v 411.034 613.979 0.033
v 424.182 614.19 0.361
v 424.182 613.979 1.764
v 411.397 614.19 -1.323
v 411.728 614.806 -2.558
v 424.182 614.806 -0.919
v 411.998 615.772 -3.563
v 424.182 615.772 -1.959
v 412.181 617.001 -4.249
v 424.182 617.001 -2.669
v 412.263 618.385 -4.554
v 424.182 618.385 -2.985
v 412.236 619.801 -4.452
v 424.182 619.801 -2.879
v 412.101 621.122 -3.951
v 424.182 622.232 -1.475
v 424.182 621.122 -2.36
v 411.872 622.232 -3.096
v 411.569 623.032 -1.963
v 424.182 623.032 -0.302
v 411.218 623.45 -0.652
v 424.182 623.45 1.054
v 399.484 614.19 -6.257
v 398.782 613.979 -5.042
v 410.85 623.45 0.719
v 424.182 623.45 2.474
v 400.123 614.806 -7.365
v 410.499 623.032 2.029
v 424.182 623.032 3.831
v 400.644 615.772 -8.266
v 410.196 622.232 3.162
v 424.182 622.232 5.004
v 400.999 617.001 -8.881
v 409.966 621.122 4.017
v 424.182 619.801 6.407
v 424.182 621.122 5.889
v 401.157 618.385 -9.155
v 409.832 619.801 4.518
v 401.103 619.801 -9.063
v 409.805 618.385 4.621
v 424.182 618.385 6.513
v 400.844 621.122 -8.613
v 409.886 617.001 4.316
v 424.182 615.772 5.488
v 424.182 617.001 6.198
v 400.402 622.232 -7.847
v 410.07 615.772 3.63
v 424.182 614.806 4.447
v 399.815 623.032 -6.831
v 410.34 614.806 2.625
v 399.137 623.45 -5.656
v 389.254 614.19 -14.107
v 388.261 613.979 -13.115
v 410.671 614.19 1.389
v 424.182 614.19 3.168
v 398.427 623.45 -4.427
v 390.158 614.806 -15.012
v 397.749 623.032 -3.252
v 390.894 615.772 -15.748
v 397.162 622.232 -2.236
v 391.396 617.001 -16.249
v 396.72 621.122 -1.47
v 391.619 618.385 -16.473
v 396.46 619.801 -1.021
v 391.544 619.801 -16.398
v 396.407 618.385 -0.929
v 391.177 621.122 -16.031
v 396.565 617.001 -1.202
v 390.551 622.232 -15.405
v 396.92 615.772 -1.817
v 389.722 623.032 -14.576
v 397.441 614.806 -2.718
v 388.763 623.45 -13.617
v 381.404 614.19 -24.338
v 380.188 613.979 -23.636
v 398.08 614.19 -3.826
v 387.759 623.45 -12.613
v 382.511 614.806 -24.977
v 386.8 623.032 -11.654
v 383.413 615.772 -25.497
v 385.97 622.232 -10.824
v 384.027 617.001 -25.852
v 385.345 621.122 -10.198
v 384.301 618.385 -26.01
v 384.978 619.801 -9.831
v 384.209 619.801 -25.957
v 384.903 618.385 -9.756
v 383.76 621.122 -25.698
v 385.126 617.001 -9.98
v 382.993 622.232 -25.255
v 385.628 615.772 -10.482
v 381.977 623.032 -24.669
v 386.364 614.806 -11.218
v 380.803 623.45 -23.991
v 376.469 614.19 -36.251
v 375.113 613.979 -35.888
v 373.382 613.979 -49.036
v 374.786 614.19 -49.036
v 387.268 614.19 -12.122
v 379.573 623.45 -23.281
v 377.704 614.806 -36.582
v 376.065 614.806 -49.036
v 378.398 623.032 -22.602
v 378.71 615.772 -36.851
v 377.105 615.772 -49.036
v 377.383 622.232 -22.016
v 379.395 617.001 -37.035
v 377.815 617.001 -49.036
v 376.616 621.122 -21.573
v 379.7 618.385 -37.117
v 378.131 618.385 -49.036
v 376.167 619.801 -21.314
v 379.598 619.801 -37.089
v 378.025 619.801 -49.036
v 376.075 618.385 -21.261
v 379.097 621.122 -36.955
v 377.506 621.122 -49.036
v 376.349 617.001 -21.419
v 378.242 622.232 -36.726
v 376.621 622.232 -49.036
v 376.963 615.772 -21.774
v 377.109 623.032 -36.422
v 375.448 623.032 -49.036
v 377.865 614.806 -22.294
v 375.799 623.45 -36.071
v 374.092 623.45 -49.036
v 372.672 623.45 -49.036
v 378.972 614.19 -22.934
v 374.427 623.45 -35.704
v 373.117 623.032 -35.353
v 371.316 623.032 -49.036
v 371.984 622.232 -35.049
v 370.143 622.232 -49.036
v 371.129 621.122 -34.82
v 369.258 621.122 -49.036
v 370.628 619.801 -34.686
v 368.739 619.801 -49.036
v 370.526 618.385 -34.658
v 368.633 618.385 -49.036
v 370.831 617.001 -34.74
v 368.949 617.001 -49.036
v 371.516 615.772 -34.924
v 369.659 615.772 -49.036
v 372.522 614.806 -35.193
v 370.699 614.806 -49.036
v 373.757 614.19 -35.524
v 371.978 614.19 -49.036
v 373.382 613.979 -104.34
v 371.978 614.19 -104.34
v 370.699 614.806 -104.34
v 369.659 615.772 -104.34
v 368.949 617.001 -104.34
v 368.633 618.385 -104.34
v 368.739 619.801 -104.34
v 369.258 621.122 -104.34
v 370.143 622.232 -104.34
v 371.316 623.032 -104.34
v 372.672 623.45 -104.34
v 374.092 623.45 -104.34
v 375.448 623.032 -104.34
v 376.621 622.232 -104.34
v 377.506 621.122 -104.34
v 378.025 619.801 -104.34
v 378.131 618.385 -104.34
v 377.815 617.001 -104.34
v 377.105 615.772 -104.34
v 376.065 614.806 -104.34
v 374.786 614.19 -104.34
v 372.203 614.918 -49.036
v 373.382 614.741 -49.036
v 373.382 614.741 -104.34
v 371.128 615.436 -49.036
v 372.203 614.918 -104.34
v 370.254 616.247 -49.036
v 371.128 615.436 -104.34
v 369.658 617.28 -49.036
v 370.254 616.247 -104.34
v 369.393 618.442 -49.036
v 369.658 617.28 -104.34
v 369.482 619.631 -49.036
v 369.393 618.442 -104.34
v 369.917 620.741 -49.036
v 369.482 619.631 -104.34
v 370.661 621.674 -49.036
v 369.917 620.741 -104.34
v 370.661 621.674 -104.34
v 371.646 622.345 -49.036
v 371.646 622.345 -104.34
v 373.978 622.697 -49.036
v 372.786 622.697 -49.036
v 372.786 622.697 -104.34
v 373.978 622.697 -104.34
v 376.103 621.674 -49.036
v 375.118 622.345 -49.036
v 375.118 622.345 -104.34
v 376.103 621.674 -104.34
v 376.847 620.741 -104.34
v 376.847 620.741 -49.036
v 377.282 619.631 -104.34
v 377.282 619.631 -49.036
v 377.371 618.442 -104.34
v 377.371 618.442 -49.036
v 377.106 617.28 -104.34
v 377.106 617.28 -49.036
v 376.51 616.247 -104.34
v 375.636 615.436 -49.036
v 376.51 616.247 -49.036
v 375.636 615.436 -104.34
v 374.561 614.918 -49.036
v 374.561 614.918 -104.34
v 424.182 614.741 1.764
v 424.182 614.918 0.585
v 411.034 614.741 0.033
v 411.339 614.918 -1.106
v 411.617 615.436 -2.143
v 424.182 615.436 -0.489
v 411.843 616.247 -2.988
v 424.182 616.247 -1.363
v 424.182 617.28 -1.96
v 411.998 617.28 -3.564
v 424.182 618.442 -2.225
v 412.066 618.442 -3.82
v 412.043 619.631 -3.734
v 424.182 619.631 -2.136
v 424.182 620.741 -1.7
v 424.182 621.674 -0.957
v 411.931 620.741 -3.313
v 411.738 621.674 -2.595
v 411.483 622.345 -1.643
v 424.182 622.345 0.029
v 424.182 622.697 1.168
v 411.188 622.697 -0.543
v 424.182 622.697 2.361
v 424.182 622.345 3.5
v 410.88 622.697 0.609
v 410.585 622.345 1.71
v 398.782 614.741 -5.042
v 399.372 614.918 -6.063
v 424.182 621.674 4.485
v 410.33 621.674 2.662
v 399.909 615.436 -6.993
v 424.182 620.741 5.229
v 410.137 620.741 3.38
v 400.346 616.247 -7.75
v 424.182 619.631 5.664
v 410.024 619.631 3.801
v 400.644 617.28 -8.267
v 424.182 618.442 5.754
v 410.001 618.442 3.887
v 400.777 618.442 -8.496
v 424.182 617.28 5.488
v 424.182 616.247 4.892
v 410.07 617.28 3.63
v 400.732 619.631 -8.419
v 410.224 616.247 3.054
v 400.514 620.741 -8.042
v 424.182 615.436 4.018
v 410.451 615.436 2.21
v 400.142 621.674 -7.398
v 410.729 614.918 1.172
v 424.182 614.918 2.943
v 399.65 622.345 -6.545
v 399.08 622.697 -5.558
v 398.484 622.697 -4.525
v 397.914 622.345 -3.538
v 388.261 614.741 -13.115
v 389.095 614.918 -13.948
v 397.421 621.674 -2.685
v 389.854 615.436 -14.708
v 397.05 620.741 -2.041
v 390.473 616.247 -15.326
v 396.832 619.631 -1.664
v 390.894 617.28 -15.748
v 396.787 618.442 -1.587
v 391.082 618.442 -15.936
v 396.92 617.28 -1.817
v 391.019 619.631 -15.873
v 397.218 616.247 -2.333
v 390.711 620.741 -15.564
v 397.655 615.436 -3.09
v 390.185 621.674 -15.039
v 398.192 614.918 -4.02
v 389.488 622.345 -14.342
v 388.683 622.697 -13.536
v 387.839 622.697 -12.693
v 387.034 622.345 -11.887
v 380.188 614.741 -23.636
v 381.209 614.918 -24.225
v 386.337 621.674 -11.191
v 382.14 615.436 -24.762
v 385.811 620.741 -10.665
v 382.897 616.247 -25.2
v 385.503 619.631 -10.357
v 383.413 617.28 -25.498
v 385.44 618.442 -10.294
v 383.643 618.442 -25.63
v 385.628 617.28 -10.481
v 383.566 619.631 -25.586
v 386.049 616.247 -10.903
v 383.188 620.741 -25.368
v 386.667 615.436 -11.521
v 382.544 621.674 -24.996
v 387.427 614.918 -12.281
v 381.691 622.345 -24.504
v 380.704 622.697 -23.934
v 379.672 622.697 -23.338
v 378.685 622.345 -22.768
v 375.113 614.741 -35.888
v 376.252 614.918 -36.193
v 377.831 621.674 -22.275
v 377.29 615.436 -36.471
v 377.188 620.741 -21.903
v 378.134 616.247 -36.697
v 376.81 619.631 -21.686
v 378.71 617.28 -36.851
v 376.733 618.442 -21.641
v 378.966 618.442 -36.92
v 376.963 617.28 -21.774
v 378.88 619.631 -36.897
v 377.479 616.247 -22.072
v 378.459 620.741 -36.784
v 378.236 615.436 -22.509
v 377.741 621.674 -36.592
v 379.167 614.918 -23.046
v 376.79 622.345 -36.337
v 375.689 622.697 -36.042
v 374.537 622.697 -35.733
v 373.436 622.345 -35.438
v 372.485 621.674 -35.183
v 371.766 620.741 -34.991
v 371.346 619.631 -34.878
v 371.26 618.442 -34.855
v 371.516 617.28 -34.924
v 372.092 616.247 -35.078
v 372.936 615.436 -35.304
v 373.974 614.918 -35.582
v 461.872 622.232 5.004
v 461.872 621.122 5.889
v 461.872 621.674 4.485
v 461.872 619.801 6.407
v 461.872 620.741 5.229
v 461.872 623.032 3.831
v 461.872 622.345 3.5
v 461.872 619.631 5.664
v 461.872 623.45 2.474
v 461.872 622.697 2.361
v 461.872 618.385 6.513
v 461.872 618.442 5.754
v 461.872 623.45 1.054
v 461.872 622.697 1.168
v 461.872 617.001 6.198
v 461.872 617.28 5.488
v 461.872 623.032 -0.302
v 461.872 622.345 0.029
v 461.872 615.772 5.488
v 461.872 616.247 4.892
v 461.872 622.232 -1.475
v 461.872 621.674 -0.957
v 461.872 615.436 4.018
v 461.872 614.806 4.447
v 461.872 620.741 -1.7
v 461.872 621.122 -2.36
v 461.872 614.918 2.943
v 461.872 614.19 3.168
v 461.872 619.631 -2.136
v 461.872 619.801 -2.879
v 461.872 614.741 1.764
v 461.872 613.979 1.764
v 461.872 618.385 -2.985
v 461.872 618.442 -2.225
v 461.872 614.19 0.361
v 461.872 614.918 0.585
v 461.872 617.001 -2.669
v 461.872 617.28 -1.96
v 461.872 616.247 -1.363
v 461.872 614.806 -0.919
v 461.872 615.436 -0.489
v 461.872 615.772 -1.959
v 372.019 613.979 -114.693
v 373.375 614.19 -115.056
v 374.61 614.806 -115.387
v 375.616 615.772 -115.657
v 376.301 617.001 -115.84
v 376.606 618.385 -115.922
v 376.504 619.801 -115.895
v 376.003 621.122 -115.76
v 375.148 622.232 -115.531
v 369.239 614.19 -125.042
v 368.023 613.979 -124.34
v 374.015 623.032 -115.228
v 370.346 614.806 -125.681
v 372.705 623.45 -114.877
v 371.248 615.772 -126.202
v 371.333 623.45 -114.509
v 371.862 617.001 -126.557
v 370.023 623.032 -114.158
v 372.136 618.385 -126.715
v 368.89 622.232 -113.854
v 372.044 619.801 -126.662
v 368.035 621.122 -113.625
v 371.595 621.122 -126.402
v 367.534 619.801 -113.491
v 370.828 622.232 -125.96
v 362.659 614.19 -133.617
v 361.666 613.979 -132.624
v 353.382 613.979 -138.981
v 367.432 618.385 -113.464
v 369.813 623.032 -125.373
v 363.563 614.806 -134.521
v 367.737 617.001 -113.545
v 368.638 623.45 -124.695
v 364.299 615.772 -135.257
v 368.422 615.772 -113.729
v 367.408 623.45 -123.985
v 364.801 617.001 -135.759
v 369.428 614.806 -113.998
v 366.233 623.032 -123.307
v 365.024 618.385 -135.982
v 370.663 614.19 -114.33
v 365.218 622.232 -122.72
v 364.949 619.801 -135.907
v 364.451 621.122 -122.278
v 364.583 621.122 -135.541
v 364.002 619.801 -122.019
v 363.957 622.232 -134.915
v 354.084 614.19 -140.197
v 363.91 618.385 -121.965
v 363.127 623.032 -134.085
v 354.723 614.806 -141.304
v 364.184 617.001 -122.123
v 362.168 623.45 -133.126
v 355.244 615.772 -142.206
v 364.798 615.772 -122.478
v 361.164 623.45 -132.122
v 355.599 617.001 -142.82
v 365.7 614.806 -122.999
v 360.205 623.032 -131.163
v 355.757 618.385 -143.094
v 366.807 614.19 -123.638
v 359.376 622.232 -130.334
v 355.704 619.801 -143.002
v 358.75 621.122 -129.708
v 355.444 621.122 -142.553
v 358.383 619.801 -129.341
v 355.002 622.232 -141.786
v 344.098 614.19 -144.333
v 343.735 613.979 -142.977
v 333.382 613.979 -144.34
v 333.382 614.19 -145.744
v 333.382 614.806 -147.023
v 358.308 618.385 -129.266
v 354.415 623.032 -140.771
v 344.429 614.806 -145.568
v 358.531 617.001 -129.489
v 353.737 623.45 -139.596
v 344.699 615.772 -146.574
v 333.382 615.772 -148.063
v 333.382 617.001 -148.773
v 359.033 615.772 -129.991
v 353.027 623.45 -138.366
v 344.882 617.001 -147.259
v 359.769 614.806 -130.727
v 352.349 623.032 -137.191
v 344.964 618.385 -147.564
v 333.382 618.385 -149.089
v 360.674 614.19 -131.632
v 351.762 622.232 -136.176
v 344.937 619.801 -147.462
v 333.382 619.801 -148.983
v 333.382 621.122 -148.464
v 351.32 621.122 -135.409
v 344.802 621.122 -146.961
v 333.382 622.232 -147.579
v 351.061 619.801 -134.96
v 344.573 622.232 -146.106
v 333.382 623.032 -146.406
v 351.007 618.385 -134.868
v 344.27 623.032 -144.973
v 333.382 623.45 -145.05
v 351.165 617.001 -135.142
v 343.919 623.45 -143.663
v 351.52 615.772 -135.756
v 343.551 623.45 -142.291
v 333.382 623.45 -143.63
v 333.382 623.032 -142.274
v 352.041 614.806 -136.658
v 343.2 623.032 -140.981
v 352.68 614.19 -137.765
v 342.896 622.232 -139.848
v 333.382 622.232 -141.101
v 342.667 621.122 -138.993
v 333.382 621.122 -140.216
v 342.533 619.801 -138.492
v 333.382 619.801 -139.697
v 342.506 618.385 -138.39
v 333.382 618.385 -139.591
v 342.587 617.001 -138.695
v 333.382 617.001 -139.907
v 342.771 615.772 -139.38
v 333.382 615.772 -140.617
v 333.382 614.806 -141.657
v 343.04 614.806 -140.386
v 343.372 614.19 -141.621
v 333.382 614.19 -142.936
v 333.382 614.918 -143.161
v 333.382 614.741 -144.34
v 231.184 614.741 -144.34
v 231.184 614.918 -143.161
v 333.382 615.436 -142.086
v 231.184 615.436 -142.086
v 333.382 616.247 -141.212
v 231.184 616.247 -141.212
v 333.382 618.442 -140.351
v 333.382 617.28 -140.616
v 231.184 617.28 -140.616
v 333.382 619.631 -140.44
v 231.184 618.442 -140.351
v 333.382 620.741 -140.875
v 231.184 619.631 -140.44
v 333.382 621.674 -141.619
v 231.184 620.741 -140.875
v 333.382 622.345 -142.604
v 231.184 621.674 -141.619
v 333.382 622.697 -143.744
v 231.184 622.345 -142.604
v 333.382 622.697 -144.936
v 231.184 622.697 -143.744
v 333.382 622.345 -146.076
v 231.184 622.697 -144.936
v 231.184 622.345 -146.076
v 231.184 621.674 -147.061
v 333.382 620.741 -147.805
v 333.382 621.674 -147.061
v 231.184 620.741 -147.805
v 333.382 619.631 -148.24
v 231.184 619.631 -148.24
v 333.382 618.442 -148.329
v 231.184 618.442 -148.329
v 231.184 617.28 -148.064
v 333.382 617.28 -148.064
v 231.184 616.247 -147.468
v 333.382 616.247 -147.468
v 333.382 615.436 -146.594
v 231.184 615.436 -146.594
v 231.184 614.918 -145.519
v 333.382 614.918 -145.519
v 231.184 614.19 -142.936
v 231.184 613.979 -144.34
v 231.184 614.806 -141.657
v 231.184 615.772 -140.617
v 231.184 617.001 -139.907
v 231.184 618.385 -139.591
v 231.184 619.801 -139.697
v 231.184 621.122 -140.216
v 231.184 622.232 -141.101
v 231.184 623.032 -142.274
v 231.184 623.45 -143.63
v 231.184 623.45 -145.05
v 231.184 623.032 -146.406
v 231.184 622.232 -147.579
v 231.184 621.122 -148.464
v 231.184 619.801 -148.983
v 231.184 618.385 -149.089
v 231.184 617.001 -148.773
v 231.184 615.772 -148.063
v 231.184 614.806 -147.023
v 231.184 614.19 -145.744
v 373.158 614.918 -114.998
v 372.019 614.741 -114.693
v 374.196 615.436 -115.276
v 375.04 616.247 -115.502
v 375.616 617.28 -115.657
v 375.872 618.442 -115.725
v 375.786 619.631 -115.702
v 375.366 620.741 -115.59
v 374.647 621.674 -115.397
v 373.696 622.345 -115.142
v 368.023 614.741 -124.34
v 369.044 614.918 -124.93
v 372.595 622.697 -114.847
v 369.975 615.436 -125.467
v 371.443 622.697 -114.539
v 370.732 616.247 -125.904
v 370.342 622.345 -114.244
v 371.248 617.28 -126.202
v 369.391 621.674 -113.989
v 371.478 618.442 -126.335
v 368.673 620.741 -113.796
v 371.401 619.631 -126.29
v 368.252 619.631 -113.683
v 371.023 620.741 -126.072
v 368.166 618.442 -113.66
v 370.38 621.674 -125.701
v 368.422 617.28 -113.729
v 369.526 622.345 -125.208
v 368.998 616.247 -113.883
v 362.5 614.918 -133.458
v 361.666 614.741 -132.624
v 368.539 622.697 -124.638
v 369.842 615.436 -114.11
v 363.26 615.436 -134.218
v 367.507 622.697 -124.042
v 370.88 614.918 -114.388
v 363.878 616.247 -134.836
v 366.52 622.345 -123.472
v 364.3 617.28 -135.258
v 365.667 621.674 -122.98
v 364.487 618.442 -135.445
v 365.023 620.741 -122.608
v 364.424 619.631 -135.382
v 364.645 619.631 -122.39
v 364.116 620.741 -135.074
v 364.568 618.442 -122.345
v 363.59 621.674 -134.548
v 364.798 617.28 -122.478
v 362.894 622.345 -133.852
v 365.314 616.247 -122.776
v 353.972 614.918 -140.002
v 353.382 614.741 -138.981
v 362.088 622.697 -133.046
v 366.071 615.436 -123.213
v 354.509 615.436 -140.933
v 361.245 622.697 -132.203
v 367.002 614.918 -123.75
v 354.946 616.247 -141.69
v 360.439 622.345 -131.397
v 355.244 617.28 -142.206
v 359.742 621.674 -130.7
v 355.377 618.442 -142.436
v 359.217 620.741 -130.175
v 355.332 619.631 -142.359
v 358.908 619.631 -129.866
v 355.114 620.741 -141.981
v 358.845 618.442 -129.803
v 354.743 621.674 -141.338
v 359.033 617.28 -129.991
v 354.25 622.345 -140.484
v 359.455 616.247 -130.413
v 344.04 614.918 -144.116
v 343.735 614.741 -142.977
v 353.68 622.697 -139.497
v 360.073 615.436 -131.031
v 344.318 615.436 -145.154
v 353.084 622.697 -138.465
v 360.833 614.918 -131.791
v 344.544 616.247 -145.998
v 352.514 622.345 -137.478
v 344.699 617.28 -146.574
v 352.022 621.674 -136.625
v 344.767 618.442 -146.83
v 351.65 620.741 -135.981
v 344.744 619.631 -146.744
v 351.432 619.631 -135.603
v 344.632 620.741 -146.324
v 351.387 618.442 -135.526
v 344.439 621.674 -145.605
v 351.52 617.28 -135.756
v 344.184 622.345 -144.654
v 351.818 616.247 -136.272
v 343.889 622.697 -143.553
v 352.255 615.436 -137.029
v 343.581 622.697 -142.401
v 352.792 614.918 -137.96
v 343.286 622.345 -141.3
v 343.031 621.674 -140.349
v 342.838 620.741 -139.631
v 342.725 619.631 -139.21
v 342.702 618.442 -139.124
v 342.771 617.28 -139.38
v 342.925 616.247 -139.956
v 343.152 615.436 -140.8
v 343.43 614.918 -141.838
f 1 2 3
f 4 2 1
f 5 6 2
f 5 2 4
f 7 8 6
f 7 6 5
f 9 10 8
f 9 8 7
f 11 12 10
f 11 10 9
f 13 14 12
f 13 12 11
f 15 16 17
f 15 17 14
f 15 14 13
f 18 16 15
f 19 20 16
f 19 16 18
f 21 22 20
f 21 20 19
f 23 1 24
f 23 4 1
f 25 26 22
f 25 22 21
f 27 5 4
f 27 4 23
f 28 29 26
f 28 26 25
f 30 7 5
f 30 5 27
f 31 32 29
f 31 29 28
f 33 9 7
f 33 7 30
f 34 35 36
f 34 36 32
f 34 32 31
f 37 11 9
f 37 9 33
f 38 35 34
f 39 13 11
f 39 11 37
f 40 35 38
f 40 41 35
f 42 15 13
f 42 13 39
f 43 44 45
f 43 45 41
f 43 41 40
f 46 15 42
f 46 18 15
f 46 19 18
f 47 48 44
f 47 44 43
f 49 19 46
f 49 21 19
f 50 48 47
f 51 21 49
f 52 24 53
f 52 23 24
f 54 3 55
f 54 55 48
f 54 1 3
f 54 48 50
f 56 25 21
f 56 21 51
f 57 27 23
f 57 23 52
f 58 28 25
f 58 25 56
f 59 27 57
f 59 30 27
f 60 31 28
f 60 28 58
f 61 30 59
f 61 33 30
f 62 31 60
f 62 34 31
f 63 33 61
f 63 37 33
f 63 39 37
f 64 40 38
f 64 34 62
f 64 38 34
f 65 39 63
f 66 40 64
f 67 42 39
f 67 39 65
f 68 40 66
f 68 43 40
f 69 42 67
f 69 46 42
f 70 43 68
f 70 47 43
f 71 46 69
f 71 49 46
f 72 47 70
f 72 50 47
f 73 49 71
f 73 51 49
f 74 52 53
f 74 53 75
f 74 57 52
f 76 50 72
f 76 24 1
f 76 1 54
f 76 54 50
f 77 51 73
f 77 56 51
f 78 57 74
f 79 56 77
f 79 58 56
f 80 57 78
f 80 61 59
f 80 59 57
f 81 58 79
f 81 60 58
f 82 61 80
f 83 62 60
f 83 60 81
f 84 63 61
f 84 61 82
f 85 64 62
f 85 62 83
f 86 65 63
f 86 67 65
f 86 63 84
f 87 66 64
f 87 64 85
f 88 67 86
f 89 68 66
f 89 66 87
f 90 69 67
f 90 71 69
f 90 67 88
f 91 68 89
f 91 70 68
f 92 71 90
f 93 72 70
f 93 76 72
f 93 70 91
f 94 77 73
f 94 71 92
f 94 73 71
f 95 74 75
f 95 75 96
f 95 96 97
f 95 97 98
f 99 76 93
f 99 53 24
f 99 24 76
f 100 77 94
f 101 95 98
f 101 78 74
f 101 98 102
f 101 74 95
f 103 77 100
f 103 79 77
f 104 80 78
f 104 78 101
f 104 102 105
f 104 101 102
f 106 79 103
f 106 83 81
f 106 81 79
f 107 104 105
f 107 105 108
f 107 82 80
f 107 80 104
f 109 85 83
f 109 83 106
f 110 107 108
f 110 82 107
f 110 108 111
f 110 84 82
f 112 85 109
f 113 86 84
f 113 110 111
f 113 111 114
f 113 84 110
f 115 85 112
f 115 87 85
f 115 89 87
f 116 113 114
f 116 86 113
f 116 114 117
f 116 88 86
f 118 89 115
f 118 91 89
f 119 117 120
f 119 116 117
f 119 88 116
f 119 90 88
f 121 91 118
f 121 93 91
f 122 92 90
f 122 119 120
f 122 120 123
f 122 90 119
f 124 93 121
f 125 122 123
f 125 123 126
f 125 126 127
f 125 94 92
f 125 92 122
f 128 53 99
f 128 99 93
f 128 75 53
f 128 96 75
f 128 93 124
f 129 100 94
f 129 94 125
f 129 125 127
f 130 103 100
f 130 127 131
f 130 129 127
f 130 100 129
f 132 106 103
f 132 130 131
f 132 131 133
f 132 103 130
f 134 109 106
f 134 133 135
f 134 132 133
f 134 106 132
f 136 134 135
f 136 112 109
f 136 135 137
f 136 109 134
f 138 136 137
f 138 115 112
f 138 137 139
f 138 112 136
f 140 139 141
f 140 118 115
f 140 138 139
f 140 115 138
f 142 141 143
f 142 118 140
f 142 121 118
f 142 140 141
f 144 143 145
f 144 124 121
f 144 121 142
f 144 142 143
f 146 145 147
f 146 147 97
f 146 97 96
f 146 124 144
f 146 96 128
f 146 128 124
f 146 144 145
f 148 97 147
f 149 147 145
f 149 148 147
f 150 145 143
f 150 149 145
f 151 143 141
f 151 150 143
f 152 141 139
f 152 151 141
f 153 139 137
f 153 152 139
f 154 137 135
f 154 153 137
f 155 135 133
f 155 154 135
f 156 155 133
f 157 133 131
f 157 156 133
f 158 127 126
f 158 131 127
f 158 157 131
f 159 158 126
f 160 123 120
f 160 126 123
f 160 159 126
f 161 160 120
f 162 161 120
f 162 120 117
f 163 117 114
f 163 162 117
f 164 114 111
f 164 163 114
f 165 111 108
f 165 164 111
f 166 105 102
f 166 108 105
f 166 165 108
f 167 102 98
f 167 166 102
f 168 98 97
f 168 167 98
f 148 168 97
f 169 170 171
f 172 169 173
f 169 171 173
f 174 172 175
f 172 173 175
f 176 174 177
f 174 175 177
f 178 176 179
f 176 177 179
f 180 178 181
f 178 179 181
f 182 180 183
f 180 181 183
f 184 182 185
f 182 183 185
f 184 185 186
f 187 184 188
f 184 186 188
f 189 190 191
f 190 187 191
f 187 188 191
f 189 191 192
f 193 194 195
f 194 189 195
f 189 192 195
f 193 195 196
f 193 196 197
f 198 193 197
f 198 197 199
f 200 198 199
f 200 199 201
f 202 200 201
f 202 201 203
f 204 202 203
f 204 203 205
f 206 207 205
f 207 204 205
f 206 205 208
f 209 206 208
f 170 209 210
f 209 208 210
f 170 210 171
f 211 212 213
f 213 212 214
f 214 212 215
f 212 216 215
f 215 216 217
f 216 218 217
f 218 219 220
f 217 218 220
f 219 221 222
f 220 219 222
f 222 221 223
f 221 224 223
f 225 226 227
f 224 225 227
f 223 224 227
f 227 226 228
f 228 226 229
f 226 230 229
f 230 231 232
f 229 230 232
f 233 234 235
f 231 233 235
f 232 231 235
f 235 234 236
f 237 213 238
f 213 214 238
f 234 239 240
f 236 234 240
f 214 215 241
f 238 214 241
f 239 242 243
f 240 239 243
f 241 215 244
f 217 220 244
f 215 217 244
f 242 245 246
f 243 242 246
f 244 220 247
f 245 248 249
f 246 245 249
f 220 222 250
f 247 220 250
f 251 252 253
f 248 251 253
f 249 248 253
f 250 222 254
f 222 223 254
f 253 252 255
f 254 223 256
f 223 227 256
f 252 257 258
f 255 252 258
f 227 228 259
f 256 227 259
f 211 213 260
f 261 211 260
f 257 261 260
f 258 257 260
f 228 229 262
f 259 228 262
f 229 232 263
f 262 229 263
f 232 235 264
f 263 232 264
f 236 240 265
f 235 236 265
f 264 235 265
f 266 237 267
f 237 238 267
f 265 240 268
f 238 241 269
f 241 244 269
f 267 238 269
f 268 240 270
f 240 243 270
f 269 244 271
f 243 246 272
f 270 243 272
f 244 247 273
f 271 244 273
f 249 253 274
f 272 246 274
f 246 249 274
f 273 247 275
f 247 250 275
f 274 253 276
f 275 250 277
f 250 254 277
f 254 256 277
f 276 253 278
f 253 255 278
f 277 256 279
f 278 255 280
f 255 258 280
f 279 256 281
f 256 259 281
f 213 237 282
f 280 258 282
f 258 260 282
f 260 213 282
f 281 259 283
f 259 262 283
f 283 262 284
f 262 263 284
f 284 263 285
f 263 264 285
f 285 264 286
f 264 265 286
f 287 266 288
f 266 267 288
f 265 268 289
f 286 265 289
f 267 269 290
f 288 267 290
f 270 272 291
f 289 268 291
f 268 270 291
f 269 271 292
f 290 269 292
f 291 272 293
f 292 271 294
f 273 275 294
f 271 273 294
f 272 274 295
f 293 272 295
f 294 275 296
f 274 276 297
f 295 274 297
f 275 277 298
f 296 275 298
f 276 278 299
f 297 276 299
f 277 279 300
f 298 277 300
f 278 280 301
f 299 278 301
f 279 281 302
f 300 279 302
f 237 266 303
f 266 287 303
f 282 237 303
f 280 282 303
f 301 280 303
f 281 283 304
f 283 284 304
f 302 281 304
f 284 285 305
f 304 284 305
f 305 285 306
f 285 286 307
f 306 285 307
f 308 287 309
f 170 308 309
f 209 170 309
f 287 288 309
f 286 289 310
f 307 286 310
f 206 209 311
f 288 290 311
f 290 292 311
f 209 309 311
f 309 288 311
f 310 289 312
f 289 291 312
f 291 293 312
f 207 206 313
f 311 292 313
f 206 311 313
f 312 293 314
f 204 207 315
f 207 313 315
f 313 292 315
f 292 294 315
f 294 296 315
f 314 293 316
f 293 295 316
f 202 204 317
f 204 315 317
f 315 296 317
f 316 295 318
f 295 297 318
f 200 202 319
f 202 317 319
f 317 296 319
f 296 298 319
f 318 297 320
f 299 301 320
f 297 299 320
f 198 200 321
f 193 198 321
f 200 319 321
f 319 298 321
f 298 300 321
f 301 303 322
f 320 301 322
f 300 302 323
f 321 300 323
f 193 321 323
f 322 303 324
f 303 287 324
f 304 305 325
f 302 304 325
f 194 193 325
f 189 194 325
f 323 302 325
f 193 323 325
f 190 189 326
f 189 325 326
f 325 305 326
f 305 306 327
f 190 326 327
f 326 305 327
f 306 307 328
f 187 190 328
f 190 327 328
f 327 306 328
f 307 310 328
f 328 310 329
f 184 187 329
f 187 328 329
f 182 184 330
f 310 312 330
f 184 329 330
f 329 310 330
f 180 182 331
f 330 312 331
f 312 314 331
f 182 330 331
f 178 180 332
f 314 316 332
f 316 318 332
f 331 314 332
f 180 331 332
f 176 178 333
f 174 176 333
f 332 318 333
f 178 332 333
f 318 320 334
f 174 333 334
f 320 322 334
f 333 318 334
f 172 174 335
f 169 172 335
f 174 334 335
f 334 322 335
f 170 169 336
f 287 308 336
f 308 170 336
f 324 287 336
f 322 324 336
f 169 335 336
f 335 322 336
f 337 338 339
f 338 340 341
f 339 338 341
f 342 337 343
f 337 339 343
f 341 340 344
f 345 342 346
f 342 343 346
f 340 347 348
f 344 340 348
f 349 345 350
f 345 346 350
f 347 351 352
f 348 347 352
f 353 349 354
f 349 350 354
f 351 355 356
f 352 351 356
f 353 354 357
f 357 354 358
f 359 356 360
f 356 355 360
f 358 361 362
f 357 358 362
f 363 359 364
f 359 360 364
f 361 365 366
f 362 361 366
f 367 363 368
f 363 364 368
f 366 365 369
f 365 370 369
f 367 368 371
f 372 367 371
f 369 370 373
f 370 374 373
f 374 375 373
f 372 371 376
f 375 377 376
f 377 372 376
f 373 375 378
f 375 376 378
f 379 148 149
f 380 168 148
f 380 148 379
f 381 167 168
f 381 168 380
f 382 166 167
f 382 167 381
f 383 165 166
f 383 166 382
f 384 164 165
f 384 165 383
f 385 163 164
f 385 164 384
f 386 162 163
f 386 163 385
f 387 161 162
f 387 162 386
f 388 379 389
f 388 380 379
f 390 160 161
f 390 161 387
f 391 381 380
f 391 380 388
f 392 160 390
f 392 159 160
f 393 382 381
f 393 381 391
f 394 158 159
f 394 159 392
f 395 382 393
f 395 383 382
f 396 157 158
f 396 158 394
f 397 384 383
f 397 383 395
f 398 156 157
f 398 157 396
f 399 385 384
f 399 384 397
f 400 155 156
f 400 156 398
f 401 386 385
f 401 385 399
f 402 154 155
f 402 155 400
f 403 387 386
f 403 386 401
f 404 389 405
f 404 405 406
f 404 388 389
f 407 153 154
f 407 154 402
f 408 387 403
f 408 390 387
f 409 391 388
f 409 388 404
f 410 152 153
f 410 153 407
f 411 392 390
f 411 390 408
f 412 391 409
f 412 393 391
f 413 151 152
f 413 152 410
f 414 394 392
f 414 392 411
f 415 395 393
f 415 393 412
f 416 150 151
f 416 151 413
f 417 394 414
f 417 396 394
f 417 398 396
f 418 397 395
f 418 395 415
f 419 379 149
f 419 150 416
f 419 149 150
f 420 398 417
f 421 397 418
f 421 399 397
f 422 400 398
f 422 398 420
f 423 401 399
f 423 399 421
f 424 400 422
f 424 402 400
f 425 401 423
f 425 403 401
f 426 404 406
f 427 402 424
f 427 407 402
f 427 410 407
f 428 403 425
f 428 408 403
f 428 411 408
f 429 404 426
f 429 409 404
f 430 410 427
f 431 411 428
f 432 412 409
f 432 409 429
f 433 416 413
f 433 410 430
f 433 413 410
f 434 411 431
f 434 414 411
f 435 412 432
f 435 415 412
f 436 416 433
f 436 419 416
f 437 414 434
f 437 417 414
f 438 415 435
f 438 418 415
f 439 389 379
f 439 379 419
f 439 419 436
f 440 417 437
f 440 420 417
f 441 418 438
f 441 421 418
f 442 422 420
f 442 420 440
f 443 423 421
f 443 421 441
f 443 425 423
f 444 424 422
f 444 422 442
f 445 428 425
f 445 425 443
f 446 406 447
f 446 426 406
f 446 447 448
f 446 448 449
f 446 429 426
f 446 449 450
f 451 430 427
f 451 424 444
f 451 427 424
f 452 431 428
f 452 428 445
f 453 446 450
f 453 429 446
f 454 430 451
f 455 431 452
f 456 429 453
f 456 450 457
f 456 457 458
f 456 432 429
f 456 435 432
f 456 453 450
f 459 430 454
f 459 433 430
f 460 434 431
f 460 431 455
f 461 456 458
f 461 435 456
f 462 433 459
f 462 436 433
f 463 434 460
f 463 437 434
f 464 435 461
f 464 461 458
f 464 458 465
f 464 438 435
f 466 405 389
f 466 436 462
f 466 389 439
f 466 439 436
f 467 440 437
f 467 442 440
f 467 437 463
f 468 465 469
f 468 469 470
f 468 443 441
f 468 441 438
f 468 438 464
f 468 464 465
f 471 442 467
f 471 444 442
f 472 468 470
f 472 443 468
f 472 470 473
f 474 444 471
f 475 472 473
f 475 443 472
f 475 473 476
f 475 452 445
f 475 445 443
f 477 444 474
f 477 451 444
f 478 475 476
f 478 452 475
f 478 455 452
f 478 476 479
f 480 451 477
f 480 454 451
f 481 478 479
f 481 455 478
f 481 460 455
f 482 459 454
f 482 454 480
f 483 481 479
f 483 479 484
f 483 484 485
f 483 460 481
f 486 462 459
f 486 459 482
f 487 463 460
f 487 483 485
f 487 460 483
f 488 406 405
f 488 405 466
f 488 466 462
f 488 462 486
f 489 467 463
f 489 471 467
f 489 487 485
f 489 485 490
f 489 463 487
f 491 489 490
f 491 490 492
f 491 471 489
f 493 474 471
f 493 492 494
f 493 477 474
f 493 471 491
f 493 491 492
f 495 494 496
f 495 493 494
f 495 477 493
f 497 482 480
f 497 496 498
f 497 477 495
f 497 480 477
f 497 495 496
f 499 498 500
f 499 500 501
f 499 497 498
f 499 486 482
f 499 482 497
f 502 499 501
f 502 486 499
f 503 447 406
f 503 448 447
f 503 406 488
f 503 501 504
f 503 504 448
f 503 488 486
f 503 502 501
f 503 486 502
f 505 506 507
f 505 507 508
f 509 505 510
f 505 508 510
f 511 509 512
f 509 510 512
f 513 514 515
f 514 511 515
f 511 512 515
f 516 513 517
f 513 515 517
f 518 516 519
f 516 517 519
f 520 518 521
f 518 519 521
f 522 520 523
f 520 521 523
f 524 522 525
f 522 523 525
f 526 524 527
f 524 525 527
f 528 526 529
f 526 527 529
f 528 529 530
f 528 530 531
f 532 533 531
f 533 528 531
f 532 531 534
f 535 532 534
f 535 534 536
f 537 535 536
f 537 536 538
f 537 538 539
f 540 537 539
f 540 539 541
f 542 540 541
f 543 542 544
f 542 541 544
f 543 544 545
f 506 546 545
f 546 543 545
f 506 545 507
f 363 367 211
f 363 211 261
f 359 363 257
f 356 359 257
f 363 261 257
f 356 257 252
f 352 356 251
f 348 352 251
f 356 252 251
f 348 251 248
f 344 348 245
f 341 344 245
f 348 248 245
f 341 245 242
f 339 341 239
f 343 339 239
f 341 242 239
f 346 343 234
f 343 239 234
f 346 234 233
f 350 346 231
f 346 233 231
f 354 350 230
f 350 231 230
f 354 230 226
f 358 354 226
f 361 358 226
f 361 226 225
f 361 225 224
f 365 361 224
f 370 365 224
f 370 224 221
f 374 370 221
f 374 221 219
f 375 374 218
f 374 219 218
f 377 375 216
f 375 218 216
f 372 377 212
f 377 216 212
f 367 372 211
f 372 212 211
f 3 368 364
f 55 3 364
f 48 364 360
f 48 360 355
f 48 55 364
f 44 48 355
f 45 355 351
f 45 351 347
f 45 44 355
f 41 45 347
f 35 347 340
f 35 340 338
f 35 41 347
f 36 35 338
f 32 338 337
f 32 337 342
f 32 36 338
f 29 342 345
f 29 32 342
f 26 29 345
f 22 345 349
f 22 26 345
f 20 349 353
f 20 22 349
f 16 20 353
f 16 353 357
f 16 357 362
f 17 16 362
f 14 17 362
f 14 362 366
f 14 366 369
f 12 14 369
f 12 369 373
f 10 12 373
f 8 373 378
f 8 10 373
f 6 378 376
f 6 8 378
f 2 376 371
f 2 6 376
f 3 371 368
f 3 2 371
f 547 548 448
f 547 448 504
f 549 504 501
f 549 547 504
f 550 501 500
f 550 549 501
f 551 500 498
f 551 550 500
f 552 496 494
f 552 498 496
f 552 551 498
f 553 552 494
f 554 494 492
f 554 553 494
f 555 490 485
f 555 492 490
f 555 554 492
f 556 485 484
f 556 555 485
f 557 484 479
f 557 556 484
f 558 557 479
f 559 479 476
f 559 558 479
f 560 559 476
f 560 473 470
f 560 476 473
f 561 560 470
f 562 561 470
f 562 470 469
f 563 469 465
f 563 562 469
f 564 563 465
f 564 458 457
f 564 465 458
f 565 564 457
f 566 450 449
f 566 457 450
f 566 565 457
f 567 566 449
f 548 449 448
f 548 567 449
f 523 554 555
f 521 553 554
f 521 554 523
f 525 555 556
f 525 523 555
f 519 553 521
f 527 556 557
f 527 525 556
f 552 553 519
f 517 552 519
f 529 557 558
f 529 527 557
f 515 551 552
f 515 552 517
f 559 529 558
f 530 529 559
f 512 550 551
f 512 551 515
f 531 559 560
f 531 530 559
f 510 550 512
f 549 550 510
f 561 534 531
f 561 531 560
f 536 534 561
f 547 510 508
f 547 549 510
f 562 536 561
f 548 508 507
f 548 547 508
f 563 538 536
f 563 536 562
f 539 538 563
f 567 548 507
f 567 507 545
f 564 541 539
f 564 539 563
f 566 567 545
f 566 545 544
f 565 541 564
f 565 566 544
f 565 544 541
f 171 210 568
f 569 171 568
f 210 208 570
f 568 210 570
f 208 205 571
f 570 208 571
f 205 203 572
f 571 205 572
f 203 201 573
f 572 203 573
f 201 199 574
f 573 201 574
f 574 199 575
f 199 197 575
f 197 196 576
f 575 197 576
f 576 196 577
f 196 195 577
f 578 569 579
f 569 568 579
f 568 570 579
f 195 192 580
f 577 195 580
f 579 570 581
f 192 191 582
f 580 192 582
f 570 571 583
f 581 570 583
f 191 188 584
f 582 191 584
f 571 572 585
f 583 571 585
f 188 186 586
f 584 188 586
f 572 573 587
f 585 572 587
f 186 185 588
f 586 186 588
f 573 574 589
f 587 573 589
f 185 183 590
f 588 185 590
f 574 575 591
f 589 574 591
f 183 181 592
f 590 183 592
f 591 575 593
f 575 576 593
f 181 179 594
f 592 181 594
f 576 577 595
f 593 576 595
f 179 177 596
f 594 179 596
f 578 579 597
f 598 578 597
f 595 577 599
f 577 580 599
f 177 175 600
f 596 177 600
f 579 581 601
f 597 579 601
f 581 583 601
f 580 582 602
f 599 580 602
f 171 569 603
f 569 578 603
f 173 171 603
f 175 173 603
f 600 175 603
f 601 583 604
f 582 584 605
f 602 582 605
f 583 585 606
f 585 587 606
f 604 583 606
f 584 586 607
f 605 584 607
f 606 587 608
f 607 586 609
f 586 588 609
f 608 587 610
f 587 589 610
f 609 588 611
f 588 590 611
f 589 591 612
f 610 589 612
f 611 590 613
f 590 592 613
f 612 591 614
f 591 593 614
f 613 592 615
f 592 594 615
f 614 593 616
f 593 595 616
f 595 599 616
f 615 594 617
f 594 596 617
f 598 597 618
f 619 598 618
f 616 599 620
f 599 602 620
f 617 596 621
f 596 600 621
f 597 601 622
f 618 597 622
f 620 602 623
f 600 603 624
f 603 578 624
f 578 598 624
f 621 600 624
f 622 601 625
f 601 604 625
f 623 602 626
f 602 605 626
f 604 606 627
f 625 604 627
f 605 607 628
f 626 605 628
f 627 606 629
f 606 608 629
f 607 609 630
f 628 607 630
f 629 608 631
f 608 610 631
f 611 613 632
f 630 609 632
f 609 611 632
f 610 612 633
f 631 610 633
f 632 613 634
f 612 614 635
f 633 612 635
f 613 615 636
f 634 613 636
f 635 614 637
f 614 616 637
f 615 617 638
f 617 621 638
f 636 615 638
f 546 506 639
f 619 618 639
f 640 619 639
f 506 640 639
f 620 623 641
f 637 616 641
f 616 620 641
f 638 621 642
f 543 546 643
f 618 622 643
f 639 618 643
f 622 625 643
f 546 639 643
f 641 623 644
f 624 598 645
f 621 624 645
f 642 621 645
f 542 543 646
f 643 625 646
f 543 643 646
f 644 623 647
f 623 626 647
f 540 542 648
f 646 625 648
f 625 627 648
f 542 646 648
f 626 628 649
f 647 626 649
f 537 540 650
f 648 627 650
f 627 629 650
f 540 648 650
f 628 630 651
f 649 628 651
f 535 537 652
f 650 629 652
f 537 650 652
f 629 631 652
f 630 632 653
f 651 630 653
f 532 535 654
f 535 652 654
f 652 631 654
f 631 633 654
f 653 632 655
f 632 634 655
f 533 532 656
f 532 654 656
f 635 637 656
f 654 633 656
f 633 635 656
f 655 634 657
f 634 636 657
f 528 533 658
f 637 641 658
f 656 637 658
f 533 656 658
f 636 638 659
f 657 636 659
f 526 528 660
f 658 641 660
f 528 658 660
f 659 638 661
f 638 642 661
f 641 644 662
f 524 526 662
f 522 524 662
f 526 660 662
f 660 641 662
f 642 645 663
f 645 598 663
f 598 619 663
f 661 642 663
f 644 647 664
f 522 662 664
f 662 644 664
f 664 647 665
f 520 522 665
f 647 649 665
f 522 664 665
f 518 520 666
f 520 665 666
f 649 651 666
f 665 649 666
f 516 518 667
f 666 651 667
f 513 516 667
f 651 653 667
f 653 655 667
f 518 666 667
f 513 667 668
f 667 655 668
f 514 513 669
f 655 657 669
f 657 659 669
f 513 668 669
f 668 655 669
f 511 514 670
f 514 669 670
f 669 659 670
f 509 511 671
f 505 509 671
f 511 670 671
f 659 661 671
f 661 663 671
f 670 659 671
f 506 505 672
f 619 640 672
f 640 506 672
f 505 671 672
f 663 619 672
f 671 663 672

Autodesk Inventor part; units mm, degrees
ref_plane "YZ Plane" through (0, 0, 0) normal (1, 0, 0) x (0, 1, 0)
ref_plane "XZ Plane" through (0, 0, 0) normal (0, 1, 0) x (-1, 0, 0)
ref_plane "Work Plane1" through (461.8718, 618.7411, 1.7643) normal (-1, 0, 0) x (0, -1, 0)
sketch "Sketch3" plane through (461.8718, 618.7411, 1.7643) normal (-1, 0, 0) x (0, -1, 0)
  circle A0 centre (0, 0) radius 4.7625
  circle A1 centre (0, 0) radius 4.0005
sketch3d "3D Sketch1"
  line L0 (461.8718, 618.7411, 1.7643) -> (424.1819, 618.7411, 1.7643)
  arc A0 (424.1819, 618.7411, 1.7643) -> (373.382, 618.7411, -49.0356) centre (424.1819, 618.7411, -49.0356) ccw
  line L1 (373.382, 618.7411, -49.0356) -> (373.382, 618.7411, -104.3401)
  arc A1 (373.382, 618.7411, -104.3401) -> (333.3821, 618.7411, -144.34) centre (333.3821, 618.7411, -104.3401) ccw
  line L2 (333.3821, 618.7411, -144.34) -> (231.1845, 618.7411, -144.34)
  dimension "d4" = 50.7999
  dimension "d5" = 39.9999
sweep "Sweep1" add profiles "Sketch3" path "3D Sketch1"
equation "\"OD\" = 9.525"
equation "\"t\" = 0.762"
equation "\"L\" = PL"
equation "\"ID\" = 8.001"
equation "\"PL\" = 337.82"
equation "\"Size_Designation\" = 1.2345"
properties material "Copper"
